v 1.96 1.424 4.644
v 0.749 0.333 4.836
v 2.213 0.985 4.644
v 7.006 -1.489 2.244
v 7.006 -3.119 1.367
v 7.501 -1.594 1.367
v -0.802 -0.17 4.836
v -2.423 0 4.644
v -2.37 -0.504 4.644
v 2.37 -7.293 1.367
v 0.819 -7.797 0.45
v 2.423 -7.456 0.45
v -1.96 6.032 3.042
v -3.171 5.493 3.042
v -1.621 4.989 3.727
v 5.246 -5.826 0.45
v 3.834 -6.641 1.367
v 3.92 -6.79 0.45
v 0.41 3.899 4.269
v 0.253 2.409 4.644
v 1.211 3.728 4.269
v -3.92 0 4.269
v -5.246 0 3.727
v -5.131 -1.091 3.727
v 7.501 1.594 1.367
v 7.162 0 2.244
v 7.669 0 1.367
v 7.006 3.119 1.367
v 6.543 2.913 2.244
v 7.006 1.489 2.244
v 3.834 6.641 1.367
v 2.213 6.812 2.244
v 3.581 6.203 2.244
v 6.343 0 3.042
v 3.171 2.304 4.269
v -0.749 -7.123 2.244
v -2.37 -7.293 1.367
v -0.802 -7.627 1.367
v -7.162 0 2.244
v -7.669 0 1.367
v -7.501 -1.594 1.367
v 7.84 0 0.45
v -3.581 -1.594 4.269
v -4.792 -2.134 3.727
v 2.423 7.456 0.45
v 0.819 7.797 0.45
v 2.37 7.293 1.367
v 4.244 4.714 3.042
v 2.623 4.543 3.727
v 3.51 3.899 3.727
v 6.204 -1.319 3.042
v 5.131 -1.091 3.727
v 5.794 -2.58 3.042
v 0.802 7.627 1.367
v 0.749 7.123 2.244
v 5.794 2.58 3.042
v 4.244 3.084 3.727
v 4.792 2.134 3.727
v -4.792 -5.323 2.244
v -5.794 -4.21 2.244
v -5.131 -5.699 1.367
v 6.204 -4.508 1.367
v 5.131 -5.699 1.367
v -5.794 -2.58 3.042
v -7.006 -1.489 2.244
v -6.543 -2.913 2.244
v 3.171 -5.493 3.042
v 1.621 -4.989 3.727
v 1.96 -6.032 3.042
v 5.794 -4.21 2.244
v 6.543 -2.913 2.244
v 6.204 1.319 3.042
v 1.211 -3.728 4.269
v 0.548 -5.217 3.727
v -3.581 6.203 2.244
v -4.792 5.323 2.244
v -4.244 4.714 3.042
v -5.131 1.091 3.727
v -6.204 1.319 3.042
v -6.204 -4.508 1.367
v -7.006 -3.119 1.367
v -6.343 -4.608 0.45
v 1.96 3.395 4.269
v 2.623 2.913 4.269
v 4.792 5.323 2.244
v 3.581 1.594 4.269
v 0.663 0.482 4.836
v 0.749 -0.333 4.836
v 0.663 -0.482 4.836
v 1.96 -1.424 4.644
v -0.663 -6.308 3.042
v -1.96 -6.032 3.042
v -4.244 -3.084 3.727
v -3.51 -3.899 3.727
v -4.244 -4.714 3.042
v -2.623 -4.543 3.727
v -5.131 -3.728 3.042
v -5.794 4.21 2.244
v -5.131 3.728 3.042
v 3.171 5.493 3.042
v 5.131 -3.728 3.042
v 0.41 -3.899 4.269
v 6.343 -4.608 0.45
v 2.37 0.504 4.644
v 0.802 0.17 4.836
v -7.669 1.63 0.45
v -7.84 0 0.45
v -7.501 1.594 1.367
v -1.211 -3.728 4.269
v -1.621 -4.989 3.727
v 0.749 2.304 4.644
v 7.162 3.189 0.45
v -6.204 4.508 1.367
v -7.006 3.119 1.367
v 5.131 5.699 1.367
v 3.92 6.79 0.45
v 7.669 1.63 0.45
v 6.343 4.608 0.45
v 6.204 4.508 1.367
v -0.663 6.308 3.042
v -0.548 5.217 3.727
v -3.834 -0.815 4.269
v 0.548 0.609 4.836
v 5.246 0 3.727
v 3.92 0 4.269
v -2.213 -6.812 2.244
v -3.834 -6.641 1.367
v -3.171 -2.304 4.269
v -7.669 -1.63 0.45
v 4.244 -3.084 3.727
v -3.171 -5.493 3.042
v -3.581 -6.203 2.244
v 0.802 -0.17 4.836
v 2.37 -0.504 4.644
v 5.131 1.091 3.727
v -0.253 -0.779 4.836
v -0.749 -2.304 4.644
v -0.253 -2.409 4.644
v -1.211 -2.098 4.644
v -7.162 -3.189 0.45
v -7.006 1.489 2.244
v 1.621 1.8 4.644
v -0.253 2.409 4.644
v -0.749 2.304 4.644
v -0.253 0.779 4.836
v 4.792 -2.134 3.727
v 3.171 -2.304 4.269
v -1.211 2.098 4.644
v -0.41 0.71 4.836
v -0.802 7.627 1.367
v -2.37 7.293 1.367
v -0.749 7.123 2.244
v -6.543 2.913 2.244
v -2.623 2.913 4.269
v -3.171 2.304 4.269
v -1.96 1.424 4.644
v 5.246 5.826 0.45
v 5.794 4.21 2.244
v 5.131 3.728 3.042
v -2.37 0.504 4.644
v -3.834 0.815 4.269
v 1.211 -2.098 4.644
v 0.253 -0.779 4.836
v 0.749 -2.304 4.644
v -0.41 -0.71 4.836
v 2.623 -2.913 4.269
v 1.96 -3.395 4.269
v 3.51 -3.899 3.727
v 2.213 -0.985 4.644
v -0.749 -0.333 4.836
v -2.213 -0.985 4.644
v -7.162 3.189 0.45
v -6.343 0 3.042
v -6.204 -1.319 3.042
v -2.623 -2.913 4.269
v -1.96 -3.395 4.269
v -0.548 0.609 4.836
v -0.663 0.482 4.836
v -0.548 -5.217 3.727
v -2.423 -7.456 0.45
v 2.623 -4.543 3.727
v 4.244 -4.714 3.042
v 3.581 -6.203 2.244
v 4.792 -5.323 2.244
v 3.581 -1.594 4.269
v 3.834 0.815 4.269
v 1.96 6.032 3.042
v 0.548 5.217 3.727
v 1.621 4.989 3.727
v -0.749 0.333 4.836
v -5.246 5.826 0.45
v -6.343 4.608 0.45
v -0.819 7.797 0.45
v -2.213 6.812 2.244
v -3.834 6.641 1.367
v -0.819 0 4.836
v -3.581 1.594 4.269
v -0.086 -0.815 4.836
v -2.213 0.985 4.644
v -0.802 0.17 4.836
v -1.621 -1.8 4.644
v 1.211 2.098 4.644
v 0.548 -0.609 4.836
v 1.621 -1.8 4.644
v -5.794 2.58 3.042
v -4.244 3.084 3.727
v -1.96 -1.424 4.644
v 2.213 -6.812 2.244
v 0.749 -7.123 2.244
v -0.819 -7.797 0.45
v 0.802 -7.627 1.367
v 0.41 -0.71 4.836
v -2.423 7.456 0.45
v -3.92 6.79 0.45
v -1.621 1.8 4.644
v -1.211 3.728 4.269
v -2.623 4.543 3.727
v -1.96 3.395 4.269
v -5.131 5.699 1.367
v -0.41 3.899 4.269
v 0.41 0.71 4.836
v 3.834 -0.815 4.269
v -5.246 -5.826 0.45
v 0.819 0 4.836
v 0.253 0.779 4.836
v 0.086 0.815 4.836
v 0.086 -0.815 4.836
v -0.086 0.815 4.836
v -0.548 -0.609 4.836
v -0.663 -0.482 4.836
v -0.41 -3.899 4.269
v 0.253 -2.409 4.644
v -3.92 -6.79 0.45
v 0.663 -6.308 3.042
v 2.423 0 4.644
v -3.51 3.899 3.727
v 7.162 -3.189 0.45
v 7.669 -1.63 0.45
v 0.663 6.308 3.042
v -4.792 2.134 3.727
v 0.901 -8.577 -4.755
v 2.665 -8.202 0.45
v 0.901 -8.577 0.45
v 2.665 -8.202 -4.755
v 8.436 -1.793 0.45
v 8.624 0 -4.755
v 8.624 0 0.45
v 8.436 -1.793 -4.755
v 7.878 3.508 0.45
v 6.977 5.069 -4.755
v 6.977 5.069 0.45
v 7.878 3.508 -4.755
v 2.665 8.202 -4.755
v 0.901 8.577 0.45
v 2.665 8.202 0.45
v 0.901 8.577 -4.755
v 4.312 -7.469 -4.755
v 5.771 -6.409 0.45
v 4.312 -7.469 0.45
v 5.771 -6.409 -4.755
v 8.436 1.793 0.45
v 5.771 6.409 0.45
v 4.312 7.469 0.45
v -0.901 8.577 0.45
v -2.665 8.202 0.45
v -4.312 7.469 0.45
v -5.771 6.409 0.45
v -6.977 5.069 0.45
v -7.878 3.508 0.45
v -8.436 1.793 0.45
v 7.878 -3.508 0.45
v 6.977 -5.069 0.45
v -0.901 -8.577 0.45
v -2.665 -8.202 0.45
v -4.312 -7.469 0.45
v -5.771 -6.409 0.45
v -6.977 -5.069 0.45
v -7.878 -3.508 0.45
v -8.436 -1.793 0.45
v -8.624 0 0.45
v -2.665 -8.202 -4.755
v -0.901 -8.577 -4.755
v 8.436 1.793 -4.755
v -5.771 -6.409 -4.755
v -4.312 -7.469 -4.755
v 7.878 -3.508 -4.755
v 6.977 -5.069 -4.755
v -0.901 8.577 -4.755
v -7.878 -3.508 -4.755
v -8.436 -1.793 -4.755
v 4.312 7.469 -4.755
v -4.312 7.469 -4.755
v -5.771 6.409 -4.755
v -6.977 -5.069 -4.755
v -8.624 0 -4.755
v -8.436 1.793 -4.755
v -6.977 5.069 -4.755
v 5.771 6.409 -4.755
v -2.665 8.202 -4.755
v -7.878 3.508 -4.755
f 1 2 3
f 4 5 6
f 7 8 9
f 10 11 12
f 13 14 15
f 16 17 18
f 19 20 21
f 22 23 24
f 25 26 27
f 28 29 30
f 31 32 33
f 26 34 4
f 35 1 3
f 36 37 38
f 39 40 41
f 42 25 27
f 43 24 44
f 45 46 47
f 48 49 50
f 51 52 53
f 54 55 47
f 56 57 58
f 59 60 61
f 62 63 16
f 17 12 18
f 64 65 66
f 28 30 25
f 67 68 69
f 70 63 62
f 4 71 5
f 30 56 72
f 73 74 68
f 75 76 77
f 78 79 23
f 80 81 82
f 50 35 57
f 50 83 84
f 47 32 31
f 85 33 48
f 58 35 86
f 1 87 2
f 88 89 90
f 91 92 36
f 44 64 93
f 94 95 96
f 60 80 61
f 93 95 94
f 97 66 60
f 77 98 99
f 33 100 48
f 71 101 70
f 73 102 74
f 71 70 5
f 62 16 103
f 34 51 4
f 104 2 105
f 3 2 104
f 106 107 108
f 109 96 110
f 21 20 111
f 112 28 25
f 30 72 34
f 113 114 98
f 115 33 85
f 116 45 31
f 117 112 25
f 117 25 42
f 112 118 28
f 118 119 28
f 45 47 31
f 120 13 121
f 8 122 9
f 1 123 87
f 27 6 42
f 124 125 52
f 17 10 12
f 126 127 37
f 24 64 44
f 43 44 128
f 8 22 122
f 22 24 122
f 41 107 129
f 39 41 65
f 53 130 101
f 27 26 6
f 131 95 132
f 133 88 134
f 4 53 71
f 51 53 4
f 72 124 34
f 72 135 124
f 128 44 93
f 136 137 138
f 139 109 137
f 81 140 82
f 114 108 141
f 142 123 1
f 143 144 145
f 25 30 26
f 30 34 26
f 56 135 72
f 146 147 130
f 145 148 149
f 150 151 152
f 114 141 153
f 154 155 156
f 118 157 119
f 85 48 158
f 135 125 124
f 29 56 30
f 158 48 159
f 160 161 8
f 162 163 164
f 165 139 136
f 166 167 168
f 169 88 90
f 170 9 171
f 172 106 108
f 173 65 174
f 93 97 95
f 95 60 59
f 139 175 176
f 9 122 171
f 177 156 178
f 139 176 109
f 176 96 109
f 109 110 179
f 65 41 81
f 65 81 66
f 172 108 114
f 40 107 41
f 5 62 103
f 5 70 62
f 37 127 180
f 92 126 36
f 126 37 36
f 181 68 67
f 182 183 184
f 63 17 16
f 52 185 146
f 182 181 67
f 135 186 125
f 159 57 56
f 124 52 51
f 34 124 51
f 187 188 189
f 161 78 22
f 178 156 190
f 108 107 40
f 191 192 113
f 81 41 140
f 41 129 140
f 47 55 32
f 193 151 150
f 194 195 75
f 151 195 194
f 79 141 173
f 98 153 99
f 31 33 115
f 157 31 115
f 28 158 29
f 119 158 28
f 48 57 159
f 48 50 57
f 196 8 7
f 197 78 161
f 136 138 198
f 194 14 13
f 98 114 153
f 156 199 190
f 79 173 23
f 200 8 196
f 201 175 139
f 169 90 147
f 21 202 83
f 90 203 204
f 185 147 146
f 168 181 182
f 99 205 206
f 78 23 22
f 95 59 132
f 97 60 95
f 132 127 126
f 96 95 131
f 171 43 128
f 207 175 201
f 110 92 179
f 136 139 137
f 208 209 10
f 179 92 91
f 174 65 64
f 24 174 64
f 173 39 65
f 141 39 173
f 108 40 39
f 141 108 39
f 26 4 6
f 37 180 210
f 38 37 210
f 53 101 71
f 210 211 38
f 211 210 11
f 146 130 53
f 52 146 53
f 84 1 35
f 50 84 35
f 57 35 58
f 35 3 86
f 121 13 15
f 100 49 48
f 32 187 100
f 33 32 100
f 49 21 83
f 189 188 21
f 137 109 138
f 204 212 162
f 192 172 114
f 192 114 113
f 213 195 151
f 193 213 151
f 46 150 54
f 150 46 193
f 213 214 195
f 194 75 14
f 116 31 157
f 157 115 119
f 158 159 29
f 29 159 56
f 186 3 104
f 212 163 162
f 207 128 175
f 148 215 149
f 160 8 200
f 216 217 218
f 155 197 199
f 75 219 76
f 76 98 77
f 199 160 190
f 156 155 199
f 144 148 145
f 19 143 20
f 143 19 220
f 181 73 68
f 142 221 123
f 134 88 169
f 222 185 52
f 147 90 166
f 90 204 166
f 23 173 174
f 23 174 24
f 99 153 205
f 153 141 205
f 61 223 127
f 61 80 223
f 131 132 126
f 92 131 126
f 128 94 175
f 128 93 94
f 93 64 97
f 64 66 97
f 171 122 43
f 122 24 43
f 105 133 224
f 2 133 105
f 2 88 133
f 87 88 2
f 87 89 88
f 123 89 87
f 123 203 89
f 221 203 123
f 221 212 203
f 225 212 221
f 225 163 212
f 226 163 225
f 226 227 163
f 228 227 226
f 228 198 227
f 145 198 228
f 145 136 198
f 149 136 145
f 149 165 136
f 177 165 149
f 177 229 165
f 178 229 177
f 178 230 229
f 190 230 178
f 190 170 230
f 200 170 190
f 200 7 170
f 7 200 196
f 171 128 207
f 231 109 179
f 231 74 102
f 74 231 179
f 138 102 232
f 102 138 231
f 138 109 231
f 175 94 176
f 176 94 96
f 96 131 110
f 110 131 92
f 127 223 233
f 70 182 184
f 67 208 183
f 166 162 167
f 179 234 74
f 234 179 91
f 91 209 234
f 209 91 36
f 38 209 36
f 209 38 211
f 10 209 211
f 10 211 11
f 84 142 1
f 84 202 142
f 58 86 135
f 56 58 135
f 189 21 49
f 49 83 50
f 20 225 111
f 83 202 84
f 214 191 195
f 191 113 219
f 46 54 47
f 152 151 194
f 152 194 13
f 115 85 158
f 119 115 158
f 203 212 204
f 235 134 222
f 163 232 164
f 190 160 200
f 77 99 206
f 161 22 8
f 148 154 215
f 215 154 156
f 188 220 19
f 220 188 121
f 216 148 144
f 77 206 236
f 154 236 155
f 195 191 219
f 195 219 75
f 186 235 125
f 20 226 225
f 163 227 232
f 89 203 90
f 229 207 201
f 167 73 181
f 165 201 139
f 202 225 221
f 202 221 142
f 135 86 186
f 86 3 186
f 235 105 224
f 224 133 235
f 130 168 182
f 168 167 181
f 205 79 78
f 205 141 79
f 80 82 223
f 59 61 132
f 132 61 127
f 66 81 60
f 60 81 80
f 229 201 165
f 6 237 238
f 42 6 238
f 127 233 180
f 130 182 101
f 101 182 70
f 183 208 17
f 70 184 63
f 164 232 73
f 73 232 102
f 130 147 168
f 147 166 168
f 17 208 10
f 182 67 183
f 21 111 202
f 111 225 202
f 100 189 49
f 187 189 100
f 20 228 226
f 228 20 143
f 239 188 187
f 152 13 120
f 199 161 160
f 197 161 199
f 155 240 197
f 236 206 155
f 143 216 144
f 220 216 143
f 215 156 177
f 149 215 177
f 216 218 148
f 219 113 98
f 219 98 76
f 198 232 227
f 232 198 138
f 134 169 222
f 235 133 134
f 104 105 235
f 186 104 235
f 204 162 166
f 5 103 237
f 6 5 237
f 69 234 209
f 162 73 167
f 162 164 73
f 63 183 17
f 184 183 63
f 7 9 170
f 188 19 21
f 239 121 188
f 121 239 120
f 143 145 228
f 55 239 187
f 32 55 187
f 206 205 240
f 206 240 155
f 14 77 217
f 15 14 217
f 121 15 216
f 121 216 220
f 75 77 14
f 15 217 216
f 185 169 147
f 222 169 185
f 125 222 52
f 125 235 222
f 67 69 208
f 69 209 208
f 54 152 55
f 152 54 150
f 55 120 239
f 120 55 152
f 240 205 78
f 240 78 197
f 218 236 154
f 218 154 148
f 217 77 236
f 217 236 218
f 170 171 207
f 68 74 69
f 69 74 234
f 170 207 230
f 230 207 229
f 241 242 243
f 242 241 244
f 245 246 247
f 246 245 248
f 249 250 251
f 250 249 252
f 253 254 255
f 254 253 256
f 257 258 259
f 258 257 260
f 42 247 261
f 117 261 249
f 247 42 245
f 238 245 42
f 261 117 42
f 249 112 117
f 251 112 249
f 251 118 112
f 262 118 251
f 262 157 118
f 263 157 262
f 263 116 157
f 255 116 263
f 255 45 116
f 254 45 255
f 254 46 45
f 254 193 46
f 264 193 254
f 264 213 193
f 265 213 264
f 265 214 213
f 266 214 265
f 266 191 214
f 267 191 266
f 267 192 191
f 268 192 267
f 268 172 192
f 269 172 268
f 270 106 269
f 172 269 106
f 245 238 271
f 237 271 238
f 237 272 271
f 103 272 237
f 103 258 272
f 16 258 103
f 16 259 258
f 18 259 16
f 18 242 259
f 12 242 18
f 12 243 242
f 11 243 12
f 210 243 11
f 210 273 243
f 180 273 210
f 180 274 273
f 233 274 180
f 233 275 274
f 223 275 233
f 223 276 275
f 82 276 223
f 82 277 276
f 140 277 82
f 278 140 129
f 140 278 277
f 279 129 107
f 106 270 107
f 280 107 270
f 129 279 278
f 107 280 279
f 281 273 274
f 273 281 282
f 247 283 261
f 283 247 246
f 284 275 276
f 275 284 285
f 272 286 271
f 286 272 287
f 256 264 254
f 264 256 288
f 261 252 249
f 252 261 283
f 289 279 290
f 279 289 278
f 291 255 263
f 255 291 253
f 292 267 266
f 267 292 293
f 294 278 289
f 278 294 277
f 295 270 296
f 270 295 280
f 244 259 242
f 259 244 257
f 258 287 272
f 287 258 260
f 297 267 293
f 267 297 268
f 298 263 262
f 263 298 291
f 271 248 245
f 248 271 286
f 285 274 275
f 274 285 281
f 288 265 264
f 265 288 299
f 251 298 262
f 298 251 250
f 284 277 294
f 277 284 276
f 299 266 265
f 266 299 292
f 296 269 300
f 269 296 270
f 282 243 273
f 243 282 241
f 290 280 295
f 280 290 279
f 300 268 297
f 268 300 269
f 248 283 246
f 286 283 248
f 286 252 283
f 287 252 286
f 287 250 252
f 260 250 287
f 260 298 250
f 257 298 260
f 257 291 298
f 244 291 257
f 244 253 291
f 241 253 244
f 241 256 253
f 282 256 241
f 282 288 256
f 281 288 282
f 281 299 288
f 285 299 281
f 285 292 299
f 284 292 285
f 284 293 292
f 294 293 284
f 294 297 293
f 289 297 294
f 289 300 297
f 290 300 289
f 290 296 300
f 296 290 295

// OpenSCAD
r_bille=0.8; //rayon de la bille
h_bille=0.45;  //hauteur de la bille

r_socle=1.1*r_bille; //rayon de socle (cylindre)
h_socle=h_bille; //hauteur de cylinder

//dimenstion du pavé 
x_paver = 11.7;
y_paver = 19.7;
z_paver = 6;
$fn=30; //la résoluion
//construcion de module bille pour l'ecriture braille 
module bille(){
    union(){
        scale([r_bille,r_bille,h_bille])
        color("red")    
        sphere(1.,center=true);
        translate([0.,0.,-(h_bille/2.)])
        color("blue")
        cylinder(h=h_socle,r=r_socle, center = true);
        
           translate([0.,0.,-((h_socle))])
        
        color("blue")
        cylinder(h=0.162244,r=r_socle, center = true);
        
        }
    }
    
   translate([0,0,0.45]) /*rotate(180, [0,1,0])*/  
    scale(9.8,9.8,9.8)
    bille();
    

    
